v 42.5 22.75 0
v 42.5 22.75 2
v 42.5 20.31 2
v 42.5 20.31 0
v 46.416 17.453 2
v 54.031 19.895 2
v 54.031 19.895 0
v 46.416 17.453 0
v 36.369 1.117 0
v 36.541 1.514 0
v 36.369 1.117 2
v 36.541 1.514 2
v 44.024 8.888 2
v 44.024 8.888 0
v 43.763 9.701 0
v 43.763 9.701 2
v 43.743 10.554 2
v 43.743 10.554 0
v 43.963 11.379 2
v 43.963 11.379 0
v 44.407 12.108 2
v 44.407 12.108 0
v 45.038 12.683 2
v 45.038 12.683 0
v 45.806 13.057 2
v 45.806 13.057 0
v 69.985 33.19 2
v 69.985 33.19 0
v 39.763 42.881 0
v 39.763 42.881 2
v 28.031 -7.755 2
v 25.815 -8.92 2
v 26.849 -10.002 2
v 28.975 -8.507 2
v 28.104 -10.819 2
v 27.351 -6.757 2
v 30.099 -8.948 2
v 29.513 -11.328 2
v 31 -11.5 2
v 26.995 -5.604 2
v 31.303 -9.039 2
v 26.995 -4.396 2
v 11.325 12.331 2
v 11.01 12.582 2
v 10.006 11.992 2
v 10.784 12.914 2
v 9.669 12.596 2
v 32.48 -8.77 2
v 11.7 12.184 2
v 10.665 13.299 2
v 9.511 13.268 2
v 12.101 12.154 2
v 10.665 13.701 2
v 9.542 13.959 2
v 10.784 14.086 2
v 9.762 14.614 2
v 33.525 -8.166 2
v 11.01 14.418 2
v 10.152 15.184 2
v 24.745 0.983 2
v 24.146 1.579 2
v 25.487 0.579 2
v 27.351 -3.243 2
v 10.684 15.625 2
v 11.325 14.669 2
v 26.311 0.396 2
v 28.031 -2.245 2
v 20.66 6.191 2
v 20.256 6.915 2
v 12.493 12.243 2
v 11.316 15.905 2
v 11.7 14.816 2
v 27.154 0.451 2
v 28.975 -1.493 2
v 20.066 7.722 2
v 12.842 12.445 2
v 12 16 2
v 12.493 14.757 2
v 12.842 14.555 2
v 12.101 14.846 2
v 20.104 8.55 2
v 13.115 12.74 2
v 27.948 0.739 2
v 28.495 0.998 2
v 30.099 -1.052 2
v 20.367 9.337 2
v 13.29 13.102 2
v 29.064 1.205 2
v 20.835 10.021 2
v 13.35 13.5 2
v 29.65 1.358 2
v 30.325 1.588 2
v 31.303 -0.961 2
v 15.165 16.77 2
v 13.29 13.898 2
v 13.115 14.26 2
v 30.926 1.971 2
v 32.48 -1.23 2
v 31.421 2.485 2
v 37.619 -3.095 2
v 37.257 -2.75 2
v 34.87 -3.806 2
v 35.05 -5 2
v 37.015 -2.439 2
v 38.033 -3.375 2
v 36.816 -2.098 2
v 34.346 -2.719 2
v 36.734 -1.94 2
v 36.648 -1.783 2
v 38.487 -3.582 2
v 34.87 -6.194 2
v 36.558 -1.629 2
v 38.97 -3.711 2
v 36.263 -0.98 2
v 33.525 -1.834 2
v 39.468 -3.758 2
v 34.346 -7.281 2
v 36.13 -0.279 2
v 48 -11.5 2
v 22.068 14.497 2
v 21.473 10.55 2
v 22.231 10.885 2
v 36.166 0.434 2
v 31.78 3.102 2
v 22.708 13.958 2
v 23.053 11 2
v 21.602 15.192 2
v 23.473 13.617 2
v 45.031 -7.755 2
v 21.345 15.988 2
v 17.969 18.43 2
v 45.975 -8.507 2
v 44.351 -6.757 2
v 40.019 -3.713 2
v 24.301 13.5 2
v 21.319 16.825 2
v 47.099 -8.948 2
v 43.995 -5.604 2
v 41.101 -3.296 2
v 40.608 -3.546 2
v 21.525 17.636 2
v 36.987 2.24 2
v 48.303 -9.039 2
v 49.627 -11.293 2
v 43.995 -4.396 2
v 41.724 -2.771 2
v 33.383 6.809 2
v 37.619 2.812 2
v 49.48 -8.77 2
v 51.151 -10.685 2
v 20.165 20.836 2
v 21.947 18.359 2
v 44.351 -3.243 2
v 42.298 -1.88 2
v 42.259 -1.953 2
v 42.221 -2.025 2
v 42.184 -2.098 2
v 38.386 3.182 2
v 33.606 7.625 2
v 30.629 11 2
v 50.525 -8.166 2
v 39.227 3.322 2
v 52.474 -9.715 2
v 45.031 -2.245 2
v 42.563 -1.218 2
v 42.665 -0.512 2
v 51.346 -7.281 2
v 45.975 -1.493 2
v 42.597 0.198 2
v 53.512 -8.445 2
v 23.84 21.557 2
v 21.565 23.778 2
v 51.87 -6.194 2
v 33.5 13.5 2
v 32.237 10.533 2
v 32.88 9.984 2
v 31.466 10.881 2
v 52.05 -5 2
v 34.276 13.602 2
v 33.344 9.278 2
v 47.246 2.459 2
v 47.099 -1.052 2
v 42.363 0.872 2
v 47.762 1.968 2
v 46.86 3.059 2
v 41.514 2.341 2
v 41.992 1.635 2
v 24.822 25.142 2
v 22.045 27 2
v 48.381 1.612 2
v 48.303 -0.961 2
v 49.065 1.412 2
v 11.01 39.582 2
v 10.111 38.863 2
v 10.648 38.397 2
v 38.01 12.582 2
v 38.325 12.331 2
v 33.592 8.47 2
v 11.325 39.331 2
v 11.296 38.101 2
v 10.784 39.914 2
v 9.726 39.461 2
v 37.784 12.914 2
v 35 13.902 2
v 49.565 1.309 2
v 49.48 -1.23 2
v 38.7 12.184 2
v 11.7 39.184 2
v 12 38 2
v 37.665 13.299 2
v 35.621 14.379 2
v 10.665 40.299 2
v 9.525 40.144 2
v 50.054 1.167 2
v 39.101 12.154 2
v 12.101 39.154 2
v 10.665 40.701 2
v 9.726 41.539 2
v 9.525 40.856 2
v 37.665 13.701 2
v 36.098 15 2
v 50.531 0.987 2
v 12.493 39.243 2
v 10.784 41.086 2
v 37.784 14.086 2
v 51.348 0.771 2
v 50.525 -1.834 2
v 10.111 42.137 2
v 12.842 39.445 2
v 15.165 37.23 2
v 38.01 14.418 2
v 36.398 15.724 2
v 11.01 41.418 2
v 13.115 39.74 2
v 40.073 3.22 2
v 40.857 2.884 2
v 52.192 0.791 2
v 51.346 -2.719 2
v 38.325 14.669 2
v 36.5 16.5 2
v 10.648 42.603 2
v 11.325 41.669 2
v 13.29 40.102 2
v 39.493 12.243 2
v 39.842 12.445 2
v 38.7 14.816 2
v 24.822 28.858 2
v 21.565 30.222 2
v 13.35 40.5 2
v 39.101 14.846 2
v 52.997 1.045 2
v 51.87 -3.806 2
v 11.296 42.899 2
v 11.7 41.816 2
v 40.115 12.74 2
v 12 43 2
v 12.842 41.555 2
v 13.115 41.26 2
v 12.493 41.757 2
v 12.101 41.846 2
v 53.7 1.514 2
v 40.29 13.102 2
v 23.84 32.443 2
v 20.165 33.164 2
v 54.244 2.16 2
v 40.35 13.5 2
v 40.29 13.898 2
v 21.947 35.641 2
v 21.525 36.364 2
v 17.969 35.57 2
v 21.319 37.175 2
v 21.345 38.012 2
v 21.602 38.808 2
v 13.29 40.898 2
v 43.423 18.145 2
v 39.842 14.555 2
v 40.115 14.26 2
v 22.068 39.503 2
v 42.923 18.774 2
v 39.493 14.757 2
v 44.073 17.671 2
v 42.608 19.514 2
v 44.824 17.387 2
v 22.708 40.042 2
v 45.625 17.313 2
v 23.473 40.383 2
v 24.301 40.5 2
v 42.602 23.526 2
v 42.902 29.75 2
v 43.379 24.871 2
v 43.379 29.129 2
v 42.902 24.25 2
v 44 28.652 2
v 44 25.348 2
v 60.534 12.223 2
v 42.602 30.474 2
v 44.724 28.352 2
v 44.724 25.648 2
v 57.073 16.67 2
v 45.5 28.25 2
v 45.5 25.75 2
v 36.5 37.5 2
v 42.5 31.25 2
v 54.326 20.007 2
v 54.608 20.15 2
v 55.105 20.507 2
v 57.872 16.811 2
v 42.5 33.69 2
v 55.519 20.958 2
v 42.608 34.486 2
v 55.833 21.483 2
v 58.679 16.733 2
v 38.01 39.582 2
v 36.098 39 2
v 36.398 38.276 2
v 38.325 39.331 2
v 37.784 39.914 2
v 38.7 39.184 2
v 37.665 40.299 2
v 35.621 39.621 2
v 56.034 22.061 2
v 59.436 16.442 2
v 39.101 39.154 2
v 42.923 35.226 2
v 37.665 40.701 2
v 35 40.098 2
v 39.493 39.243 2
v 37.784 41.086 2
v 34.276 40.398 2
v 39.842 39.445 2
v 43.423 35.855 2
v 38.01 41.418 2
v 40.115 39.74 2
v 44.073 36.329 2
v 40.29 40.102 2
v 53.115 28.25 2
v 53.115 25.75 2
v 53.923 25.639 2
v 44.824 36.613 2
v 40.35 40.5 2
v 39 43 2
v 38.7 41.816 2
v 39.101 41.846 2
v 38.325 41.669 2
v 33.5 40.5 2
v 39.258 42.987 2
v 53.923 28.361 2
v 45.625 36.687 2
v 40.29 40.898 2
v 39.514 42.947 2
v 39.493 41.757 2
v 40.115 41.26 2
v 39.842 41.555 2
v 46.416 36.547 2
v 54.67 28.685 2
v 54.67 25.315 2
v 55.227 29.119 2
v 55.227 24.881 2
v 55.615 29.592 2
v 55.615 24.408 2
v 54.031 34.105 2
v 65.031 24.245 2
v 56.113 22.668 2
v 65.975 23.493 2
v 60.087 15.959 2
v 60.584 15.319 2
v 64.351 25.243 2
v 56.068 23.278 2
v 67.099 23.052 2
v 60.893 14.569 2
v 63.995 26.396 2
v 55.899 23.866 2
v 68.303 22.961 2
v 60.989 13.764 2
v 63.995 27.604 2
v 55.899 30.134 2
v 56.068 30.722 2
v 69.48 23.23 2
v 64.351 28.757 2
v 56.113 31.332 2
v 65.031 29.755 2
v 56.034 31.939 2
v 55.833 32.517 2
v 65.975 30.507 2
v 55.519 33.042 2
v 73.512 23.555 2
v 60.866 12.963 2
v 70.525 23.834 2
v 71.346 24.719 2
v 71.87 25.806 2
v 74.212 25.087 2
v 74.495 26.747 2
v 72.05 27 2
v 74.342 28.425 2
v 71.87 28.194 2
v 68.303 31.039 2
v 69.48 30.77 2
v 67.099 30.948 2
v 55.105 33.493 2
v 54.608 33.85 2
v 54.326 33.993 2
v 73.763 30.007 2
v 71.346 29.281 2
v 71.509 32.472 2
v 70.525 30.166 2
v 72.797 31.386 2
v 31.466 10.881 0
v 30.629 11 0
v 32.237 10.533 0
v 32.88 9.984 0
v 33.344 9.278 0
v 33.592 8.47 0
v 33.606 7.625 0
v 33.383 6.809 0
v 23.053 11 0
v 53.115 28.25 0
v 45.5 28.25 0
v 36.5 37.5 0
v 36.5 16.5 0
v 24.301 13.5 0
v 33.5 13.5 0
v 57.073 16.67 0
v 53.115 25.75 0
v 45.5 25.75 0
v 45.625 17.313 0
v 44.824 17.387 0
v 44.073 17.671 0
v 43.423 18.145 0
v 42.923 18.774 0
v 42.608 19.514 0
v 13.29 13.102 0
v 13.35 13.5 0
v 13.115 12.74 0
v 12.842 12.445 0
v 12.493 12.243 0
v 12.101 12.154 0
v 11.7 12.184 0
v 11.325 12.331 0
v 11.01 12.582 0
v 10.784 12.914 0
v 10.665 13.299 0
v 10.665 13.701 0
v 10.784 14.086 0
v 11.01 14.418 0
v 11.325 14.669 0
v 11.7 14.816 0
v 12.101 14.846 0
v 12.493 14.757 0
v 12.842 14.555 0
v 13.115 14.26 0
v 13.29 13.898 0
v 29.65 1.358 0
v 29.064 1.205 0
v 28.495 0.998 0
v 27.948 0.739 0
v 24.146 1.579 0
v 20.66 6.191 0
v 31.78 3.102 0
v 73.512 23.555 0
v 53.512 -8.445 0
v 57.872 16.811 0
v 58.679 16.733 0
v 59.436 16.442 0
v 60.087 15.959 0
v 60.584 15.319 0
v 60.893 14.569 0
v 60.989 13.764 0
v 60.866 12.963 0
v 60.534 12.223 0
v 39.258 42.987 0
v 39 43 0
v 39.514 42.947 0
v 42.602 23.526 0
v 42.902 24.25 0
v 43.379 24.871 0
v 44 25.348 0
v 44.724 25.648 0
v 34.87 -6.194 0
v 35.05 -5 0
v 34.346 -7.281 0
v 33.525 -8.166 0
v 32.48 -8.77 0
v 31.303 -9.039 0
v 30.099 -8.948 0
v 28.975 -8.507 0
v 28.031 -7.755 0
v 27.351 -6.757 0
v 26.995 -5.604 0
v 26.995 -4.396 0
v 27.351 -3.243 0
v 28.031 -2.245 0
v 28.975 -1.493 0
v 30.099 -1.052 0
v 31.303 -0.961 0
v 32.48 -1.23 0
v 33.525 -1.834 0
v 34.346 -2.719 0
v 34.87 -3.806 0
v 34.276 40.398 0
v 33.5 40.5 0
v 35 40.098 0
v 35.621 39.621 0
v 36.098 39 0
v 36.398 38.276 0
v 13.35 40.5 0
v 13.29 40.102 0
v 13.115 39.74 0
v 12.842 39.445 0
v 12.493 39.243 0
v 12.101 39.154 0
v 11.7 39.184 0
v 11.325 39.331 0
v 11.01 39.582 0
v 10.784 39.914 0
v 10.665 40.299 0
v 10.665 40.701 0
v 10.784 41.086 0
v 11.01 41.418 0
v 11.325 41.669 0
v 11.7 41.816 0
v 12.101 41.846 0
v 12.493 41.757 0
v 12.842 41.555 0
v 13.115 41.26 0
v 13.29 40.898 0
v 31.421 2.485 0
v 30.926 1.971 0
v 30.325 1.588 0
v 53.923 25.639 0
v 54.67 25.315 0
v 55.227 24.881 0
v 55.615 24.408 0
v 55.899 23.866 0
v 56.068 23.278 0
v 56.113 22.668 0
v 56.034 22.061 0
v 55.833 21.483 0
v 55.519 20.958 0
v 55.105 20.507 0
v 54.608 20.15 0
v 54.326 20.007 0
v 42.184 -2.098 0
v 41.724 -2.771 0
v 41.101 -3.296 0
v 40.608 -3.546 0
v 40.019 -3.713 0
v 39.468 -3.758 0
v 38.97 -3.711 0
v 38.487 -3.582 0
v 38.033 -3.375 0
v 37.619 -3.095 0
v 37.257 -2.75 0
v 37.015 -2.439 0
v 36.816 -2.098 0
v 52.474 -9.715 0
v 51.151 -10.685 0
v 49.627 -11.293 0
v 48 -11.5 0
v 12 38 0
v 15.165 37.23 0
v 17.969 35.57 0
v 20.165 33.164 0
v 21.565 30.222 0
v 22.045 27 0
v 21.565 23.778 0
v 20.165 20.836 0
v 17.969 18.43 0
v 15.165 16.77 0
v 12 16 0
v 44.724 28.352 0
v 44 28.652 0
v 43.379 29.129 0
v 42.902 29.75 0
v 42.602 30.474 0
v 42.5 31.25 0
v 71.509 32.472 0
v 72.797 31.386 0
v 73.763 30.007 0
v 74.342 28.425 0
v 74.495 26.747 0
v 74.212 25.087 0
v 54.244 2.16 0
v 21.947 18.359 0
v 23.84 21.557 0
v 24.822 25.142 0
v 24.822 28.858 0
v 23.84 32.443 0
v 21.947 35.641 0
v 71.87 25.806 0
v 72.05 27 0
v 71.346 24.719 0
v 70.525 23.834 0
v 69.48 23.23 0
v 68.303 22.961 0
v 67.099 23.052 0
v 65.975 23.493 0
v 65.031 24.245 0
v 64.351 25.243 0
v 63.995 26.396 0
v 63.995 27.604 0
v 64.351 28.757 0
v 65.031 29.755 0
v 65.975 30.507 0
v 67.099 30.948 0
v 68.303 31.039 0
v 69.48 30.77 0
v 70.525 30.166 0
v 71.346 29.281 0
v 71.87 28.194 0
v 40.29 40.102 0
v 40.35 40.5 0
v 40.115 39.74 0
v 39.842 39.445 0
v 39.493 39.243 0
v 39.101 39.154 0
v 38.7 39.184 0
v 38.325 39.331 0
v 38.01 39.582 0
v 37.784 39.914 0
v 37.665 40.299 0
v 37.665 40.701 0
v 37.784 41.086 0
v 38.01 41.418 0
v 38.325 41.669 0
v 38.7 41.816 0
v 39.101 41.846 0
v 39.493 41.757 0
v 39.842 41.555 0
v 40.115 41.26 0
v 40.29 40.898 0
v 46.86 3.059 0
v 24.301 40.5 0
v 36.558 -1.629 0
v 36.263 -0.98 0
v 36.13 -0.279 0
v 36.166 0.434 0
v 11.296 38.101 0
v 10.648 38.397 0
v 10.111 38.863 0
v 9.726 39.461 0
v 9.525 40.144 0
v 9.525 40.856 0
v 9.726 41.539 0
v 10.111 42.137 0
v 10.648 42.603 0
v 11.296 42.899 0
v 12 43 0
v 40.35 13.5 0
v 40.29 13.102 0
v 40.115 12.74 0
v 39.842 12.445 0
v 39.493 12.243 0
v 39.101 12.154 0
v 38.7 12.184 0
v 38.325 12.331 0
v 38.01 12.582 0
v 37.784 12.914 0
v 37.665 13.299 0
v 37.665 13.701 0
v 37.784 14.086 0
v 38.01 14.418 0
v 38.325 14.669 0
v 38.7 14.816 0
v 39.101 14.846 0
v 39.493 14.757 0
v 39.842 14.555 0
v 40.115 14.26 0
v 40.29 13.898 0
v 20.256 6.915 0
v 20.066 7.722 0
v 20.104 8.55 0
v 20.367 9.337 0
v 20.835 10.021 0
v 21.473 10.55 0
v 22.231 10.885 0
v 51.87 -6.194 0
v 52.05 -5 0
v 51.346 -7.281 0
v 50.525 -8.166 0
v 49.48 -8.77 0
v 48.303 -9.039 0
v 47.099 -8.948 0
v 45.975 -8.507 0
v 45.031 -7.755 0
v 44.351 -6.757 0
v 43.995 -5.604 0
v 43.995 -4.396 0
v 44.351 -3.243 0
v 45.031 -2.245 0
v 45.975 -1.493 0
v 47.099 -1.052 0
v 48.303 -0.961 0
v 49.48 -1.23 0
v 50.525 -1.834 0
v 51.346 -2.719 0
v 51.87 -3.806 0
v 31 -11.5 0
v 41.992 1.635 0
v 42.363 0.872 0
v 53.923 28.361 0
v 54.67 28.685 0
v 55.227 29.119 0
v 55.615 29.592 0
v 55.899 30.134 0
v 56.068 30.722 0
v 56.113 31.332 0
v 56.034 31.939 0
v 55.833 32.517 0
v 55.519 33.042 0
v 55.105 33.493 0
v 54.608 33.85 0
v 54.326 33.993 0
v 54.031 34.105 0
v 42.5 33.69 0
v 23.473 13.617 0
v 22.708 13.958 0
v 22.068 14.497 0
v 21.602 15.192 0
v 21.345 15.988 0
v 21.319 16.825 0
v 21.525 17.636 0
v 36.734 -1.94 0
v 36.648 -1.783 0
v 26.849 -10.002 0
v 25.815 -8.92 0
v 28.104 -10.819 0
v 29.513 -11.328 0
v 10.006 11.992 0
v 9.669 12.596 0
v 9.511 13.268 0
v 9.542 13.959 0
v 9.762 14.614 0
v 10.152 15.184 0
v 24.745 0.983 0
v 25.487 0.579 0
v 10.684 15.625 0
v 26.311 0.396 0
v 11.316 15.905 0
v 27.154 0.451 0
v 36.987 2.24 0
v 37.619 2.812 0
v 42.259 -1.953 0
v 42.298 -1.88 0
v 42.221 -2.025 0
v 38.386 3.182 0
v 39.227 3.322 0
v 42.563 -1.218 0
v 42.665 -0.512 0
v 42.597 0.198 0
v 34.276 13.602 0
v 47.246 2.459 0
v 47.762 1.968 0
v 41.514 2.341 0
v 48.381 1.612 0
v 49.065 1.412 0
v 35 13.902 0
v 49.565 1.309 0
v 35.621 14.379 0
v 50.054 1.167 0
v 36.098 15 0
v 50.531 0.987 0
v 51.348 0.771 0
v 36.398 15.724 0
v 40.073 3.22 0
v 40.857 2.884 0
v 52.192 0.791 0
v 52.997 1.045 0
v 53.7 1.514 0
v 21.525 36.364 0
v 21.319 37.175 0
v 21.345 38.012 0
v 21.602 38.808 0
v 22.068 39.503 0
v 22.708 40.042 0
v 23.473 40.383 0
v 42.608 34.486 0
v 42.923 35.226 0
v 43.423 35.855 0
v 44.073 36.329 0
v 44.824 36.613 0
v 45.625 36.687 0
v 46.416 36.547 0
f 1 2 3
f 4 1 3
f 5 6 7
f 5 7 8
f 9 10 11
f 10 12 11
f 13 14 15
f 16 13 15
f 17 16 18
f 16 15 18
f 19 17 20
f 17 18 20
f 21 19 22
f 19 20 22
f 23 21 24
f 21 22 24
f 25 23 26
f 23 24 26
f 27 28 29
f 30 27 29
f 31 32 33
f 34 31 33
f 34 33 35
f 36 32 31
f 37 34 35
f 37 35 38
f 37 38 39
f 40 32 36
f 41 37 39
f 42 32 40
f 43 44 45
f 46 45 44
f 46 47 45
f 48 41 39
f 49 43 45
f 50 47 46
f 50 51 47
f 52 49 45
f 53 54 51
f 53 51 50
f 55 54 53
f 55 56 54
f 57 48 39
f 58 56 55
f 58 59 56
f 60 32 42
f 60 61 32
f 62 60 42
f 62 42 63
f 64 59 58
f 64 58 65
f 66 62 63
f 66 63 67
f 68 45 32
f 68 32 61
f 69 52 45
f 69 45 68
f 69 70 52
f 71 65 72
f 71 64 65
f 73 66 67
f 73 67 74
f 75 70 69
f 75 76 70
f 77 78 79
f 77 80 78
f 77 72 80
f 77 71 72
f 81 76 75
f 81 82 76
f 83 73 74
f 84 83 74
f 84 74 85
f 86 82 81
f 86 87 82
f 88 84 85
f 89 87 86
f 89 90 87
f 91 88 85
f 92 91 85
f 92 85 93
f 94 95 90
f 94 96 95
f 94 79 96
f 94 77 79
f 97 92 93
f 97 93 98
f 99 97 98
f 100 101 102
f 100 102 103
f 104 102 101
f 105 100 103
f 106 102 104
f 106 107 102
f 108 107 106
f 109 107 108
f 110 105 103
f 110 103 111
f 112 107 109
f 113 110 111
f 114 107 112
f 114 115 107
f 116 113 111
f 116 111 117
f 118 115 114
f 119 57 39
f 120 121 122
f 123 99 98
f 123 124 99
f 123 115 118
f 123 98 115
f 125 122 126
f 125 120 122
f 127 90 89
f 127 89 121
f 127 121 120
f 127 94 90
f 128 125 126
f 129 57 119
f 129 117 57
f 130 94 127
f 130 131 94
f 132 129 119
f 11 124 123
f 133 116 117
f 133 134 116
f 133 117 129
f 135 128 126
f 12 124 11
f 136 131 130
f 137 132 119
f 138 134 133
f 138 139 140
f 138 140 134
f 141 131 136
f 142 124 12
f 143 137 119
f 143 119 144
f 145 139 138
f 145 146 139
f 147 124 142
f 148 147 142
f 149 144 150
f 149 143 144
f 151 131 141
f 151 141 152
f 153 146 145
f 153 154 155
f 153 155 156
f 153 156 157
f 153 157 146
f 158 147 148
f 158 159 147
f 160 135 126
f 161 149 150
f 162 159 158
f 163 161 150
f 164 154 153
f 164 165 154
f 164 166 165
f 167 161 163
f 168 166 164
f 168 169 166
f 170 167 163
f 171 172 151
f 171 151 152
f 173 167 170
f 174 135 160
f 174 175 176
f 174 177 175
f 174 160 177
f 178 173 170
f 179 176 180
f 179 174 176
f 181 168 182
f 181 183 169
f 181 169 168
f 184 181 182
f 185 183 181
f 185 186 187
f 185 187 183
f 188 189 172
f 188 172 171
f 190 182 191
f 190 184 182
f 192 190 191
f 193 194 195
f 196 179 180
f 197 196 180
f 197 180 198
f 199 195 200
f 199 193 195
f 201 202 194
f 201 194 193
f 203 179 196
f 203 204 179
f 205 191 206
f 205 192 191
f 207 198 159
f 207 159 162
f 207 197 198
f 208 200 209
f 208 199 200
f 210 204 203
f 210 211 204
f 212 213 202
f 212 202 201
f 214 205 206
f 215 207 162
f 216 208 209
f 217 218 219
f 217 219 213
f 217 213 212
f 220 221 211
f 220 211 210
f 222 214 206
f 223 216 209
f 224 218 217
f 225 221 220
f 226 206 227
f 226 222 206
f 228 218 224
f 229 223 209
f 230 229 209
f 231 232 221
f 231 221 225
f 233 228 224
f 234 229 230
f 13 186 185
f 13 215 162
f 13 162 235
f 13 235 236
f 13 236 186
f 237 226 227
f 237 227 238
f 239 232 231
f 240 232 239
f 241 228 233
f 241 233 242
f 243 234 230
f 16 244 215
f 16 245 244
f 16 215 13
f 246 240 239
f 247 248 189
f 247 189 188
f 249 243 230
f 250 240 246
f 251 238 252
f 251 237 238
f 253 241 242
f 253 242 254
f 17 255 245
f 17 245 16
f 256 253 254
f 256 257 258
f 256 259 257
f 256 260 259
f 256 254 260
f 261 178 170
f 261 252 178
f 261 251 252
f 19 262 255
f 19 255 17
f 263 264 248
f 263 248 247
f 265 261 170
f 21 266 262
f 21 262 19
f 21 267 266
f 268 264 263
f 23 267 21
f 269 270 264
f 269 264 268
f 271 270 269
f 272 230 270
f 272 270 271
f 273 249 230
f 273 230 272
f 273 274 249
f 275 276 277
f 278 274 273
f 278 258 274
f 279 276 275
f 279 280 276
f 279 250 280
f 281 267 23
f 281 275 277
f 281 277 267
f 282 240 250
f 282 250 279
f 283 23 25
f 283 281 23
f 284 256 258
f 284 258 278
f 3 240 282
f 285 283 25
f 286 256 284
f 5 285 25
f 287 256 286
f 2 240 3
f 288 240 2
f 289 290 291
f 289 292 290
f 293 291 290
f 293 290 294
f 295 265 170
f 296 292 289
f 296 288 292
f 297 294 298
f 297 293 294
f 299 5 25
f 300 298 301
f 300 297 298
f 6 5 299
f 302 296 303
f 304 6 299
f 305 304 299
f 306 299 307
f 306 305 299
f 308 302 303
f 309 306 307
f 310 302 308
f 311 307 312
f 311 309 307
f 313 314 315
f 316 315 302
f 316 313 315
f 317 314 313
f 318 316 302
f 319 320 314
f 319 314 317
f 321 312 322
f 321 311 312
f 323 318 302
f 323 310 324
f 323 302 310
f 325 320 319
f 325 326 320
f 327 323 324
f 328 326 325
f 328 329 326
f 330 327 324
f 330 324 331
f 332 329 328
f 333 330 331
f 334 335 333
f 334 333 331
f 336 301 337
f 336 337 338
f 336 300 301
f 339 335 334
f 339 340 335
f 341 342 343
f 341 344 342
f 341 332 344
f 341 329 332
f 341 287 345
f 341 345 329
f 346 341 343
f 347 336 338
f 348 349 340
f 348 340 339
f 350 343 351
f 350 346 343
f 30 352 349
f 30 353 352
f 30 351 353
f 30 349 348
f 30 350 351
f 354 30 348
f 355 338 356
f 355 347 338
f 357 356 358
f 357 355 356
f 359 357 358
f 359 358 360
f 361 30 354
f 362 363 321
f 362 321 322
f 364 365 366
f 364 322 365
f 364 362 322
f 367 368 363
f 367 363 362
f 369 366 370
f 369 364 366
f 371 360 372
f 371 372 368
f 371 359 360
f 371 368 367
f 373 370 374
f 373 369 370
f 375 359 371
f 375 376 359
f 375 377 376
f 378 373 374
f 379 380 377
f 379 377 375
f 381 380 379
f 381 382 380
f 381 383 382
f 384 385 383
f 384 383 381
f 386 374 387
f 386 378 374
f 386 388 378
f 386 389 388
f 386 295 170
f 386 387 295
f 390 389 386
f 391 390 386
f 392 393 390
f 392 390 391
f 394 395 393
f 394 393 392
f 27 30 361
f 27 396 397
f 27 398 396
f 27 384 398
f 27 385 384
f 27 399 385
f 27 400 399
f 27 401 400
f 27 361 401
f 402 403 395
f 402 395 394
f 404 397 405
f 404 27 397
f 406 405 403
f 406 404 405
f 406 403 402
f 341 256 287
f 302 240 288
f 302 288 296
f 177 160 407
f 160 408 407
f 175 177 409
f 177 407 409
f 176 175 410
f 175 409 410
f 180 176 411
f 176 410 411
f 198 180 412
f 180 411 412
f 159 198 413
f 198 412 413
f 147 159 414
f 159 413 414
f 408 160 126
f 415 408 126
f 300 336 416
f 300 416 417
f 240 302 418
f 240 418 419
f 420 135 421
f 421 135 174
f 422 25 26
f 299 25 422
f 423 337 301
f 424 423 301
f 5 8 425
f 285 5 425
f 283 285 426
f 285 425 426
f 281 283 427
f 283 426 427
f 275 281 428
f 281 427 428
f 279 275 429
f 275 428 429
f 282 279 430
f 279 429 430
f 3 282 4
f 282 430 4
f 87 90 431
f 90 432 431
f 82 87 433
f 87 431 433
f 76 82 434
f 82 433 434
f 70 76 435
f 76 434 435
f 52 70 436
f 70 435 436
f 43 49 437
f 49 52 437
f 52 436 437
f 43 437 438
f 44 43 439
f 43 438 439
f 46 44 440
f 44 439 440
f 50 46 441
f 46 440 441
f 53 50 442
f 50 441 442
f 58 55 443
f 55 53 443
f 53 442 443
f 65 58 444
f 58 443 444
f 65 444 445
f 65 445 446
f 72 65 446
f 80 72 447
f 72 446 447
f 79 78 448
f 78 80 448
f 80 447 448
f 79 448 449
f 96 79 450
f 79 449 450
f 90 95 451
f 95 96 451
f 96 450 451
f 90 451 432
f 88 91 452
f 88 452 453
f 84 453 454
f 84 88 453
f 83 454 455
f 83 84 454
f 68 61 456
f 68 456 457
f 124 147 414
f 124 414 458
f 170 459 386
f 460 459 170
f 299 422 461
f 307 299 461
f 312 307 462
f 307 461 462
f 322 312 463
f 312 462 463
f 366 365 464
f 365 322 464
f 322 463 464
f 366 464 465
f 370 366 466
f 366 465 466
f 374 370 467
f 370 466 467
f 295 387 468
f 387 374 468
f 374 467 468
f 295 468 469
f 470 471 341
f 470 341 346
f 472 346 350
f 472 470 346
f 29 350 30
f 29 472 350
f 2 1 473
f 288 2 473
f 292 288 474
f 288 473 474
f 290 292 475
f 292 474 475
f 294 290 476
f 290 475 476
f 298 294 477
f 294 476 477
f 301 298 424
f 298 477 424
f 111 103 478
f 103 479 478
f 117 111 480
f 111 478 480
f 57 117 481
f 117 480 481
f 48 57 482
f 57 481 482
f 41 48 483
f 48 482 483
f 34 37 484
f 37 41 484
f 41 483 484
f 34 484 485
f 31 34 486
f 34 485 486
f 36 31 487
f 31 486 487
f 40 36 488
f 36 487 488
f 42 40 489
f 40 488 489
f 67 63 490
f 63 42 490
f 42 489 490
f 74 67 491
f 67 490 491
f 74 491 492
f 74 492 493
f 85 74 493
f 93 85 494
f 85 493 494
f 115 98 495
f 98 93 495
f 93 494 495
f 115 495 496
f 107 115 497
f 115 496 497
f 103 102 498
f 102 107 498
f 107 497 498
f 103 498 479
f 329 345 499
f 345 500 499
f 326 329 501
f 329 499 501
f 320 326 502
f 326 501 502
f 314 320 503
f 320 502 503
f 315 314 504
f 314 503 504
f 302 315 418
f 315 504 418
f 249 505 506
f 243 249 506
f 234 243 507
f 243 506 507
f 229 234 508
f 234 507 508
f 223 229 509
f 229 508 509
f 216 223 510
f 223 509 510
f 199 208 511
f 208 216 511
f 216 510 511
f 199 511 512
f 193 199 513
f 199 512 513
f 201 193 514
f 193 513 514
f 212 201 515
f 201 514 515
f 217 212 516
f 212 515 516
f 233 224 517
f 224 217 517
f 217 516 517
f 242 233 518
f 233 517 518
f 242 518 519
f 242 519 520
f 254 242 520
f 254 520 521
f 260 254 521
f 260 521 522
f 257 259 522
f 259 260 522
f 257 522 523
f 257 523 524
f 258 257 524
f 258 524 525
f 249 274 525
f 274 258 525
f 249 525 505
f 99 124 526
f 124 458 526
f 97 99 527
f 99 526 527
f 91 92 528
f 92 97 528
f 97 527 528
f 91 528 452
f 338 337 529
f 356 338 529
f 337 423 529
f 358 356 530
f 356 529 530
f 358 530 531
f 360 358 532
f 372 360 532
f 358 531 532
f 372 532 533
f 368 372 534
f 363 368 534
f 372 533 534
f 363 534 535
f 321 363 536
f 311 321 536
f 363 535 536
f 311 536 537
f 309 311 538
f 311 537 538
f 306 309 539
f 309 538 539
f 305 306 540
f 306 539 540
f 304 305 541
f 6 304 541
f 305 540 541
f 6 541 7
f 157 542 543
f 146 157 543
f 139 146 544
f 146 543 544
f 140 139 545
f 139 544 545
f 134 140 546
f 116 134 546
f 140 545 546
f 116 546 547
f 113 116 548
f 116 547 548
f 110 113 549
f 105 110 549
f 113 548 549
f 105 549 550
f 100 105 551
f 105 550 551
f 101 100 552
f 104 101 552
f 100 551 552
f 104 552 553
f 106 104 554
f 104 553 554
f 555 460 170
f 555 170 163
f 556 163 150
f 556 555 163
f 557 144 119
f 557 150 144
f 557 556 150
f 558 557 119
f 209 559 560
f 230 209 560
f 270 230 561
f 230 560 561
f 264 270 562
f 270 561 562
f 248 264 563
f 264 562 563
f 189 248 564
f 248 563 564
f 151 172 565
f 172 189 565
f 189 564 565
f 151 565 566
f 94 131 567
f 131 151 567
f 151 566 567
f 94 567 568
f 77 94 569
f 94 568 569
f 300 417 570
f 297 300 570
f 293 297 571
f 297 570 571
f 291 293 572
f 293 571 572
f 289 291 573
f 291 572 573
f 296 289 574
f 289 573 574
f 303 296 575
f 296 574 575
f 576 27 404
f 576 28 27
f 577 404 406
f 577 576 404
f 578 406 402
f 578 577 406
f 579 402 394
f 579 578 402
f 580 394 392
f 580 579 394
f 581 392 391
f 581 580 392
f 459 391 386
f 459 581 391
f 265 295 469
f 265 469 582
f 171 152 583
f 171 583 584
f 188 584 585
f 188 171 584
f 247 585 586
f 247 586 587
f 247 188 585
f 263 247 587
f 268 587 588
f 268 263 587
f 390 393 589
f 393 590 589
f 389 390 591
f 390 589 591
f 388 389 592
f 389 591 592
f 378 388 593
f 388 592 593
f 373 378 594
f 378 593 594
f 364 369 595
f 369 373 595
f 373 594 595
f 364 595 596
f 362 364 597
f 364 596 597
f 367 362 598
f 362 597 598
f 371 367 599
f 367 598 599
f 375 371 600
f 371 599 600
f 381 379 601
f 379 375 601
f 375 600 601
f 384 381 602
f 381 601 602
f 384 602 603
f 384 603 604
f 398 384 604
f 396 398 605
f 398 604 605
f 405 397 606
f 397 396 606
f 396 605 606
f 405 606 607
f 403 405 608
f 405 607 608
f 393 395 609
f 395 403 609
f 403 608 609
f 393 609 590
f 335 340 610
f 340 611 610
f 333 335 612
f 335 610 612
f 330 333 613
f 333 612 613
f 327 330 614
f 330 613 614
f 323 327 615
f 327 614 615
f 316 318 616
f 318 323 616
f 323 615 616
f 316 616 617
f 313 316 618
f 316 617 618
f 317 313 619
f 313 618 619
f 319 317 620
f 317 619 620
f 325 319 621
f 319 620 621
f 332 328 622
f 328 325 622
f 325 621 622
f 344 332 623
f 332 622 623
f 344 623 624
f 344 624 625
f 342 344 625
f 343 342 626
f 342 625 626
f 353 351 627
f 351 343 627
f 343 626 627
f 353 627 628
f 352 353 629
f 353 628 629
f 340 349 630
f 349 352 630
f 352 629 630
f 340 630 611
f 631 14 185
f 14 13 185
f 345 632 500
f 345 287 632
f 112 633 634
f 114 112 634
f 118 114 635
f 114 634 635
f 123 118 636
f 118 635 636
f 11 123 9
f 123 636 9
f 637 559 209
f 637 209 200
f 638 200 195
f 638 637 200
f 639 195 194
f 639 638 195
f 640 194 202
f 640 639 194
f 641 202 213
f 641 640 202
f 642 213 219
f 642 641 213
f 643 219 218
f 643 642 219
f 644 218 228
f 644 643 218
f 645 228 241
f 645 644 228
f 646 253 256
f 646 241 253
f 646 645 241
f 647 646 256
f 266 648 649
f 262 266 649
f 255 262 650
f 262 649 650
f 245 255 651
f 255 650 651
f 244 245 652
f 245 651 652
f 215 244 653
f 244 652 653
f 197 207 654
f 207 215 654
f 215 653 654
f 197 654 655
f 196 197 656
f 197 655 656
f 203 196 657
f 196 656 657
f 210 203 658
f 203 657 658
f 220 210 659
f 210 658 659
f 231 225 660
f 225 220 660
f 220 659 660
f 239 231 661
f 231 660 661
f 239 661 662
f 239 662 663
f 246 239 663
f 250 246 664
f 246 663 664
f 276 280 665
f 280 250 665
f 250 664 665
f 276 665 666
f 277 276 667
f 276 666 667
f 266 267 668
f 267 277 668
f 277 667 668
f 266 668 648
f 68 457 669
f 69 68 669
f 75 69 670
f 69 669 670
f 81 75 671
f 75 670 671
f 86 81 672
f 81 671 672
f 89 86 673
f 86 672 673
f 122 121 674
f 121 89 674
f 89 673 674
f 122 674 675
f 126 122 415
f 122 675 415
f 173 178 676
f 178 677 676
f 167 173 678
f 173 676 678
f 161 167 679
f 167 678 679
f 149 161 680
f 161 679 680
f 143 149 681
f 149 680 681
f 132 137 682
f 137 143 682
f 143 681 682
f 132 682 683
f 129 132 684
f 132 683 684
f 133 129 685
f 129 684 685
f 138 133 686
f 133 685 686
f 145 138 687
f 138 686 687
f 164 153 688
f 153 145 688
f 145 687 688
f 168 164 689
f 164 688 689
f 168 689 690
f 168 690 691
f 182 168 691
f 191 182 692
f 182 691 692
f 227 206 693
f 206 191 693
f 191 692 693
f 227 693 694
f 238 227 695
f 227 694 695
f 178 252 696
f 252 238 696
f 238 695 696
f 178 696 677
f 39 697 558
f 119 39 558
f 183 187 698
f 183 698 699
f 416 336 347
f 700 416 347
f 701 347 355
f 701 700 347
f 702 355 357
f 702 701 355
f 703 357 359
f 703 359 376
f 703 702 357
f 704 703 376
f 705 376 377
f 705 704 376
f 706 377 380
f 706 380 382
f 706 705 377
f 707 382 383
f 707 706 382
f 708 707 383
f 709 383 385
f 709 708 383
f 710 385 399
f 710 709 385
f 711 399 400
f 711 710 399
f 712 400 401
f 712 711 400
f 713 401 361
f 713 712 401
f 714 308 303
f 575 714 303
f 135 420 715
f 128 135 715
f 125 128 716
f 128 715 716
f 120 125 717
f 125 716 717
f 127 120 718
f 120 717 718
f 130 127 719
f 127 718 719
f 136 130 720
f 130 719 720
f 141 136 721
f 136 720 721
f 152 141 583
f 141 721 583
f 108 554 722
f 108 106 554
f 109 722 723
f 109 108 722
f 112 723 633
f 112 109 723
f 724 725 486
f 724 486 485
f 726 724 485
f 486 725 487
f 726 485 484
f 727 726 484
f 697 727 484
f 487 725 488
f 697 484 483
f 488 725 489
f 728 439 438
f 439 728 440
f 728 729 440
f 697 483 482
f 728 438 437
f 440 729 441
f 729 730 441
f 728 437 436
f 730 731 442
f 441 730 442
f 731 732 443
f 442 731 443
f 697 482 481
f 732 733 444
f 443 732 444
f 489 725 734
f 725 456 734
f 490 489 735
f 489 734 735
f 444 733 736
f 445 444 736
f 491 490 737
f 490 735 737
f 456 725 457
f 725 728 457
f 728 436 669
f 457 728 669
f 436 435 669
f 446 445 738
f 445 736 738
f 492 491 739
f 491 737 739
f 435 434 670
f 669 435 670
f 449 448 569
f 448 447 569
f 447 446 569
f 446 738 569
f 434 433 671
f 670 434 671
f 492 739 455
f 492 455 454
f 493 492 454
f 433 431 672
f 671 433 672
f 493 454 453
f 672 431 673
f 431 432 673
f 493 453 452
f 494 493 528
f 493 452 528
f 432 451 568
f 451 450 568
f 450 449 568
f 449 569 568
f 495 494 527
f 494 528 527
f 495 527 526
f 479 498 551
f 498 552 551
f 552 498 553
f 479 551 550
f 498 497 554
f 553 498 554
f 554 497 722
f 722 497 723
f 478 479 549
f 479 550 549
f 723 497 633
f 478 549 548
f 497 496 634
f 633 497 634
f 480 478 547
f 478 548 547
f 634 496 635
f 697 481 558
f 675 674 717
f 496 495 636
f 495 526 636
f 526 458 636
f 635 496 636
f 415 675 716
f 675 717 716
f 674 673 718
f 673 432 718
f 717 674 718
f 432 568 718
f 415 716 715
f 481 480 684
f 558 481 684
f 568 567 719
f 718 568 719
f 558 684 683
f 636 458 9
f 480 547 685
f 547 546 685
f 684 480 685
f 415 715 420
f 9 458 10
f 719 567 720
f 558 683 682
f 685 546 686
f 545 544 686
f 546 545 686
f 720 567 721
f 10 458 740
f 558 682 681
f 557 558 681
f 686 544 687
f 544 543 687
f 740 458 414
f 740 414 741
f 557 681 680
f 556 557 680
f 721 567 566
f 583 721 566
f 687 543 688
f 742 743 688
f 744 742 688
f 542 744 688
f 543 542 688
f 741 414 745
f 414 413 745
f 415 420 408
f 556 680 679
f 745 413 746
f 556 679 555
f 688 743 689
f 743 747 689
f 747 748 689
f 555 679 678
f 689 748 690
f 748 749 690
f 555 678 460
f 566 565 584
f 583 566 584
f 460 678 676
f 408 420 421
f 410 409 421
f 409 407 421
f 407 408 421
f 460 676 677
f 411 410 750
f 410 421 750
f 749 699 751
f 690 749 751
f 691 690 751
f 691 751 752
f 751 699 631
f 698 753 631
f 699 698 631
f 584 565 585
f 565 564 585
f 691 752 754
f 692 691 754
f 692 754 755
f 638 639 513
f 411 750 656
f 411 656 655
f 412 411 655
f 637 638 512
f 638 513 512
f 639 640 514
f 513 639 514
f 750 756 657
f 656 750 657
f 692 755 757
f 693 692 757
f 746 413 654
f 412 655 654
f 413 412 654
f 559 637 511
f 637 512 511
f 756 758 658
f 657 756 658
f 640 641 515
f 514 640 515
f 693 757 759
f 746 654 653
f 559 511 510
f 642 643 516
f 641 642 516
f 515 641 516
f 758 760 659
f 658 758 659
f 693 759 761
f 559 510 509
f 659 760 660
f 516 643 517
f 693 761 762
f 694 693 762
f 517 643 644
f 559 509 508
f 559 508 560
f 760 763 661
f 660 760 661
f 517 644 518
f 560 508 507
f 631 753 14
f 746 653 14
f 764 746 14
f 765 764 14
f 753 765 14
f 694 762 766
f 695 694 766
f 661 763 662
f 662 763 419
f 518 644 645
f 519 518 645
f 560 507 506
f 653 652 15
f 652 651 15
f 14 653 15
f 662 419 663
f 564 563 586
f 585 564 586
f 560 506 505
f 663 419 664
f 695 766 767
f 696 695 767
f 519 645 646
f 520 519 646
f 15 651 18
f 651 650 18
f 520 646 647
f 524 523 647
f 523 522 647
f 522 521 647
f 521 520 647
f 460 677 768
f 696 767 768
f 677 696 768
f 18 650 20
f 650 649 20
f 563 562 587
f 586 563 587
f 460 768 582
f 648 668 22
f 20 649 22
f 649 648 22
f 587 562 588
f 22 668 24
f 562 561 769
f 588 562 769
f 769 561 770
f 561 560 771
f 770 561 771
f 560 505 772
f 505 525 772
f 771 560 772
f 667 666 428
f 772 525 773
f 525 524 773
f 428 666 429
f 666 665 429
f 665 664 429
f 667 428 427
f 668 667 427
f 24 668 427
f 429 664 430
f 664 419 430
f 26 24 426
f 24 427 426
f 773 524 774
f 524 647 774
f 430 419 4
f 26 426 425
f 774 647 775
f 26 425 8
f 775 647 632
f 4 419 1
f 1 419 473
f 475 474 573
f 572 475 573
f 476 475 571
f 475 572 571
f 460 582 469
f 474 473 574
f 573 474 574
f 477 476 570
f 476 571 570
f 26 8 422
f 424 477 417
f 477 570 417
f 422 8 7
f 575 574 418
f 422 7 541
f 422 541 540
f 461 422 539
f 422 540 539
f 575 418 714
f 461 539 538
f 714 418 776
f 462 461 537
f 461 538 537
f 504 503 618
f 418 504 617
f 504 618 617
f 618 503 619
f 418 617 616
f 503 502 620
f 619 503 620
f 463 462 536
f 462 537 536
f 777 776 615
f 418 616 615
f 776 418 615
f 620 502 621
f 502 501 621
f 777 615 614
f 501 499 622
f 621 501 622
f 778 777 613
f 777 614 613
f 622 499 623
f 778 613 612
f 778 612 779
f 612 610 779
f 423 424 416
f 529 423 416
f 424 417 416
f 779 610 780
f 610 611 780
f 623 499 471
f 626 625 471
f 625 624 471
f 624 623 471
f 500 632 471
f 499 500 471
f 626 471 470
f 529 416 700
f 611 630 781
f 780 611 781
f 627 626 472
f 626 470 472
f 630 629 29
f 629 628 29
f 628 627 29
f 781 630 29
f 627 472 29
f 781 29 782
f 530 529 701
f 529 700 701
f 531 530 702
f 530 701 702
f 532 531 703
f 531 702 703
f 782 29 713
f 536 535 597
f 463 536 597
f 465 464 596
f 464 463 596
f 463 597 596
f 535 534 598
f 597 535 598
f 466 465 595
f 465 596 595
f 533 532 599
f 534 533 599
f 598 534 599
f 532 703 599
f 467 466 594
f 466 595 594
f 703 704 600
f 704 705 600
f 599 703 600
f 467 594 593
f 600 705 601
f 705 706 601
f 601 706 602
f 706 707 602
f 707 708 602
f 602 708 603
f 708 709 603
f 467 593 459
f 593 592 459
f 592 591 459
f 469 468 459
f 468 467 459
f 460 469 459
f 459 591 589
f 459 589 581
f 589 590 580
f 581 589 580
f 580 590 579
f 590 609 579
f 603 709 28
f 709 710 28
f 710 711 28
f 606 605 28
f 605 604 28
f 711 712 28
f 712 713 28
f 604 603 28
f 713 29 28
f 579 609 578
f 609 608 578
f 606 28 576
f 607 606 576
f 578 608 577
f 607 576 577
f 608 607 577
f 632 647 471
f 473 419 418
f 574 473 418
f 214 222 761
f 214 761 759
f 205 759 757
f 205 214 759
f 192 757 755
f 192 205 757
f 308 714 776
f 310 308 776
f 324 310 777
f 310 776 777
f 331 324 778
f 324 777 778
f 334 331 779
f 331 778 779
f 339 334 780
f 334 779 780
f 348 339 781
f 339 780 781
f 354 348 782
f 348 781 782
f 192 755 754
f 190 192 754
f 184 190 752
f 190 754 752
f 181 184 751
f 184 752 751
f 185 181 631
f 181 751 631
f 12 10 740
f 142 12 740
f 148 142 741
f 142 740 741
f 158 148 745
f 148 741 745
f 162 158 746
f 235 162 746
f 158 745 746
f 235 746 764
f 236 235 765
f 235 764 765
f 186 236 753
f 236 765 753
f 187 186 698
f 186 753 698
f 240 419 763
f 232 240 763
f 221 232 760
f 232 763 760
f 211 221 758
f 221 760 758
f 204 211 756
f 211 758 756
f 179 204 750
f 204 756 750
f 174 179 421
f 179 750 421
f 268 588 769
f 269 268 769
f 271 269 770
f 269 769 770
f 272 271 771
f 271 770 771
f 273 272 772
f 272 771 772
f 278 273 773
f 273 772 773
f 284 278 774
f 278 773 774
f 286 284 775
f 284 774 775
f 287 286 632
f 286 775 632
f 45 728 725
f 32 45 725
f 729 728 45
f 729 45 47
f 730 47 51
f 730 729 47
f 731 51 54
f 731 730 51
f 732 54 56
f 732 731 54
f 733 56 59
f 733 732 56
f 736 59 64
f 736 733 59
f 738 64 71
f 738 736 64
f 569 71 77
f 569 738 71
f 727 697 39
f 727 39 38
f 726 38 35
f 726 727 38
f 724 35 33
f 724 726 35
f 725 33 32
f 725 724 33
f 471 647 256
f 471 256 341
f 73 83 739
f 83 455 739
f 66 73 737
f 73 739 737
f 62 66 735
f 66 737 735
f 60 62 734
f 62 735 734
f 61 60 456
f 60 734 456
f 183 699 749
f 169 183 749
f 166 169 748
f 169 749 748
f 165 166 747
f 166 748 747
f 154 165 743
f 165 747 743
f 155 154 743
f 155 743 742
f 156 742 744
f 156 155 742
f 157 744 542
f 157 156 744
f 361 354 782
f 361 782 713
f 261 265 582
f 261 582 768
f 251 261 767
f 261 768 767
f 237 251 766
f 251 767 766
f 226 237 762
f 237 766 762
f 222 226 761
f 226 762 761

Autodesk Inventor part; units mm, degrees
ref_plane "YZ Plane" through (0, 0, 0) normal (1, 0, 0) x (0, 1, 0)
ref_plane "XZ Plane" through (0, 0, 0) normal (0, 1, 0) x (-1, 0, 0)
ref_plane "XY Plane" through (0, 0, 0) normal (0, 0, 1) x (1, 0, 0)
sketch "スケッチ1" plane through (0, 0, 0) normal (0, 0, 1) x (1, 0, 0)
  circle A0 centre (68, 27) radius 4.05
  circle A1 centre (31, -5) radius 4.05
  circle A2 centre (48, -5) radius 4.05
  circle A3 centre (68, 27) radius 6.5 construction
  circle A4 centre (31, -5) radius 6.5 construction
  circle A5 centre (48, -5) radius 6.5 construction
  line L0 (31, -11.5) -> (48, -11.5)
  line L1 (73.512, 23.555) -> (53.512, -8.445)
  arc A6 (48, -11.5) -> (53.512, -8.445) centre (48, -5) ccw
  circle A7 centre (39, 13.5) radius 1.35
  line L2 (39, 13.5) -> (39, 40.5) construction
  line L3 (39, 40.5) -> (12, 40.5) construction
  line L4 (12, 40.5) -> (12, 13.5) construction
  line L5 (12, 13.5) -> (39, 13.5) construction
  circle A8 centre (12, 13.5) radius 1.35
  circle A9 centre (12, 40.5) radius 1.35
  circle A10 centre (39, 40.5) radius 1.35
  circle A11 centre (11, 27) radius 8.5 construction
  circle A12 centre (11, 27) radius 10.5 construction
  arc A13 (0, 15.381) -> (0, 38.619) centre (11, 27) ccw construction
  line L6 (0, 15.381) -> (0, 38.619) construction
  line L7 (11, 11) -> (11, 43) construction
  line L8 (11, 43) -> (51.5, 43) construction
  line L9 (51.5, 43) -> (51.5, 11) construction
  line L10 (51.5, 11) -> (11, 11) construction
  circle A14 centre (39, 13.5) radius 2.5 construction
  circle A15 centre (39, 40.5) radius 2.5 construction
  circle A16 centre (12, 40.5) radius 2.5 construction
  circle A17 centre (12, 13.5) radius 2.5 construction
  line L11 (10.0057, 11.9924) -> (25.8149, -8.9198)
  line L12 (69.9848, 33.1896) -> (39.7634, 42.8806)
  arc A18 (25.8149, -8.9198) -> (31, -11.5) centre (31, -5) ccw
  arc A19 (12, 16) -> (10.0057, 11.9924) centre (12, 13.5) ccw
  arc A20 (12, 16) -> (12, 38) centre (11, 27) ccw
  line L13 (12, 43) -> (39, 43)
  arc A21 (39.7634, 42.8806) -> (39, 43) centre (39, 40.5) ccw
  arc A22 (73.512, 23.555) -> (69.9848, 33.1896) centre (68, 27) ccw
  arc A23 (12, 43) -> (12, 38) centre (12, 40.5) ccw
  point P0 (0, 0)
  point P1 (62.8293, 30.9388)
  point P2 (24.5, -5)
  point P3 (1.5716, 22.3787)
  point P4 (39, 11)
  dimension "d60" = 21
  dimension "d17" = 8.1
  dimension "d21" = 5
  dimension "d24" = 17
  dimension "d26" = 20
  dimension "d27" = 13
  dimension "d55" = 2.7
  dimension "d56" = 27
  dimension "d57" = 27
  dimension "d58" = 17
  dimension "d59" = 1
  dimension "d61" = 32
  dimension "d62" = 13.5
  dimension "d63" = 12
  dimension "d64" = 51.5
  dimension "d65" = 5
  dimension "d66" = 57
  dimension "d67" = 32
  dimension "d68" = 32
  dimension "d69" = 20
extrude "押し出し1" add sketch "スケッチ1" along normal blind 2
sketch "スケッチ5" plane through (0, 0, 2) normal (0, 0, 1) x (1, 0, 0)
  circle A0 centre (12, 40.5) radius 1.35 projected
  circle A1 centre (39, 40.5) radius 1.35 projected
  circle A2 centre (39, 13.5) radius 1.35 projected
  circle A3 centre (12, 13.5) radius 1.35 projected
  circle A4 centre (31, -5) radius 4.05 projected
  circle A5 centre (48, -5) radius 4.05 projected
  circle A6 centre (68, 27) radius 4.05 projected
  line L0 (39, 43) -> (12, 43) projected
  circle A7 centre (12, 40.5) radius 2.5 construction
  circle A8 centre (39, 40.5) radius 2.5 construction
  circle A9 centre (39, 13.5) radius 2.5 construction
  circle A10 centre (12, 13.5) radius 2.5 construction
  circle A11 centre (31, -5) radius 6.5 construction
  circle A12 centre (48, -5) radius 6.5 construction
  circle A13 centre (68, 27) radius 6.5 construction
  arc A14 (73.512, 23.555) -> (69.9848, 33.1896) centre (68, 27) ccw projected
  line L1 (14.5, 40.5) -> (36.5, 40.5)
  line L2 (36.5, 40.5) -> (36.5, 13.5)
  line L3 (14.5, 13.5) -> (36.5, 13.5)
  arc A15 (12, 16) -> (12, 38) centre (11, 27) ccw projected
  arc A16 (14.5, 13.5) -> (14.5, 40.5) centre (11, 27) ccw
  line L4 (40.4464, 38.4609) -> (42.5, 37.8024)
  line L5 (69.9848, 33.1896) -> (39.7634, 42.8806) projected
  line L6 (68, 27) -> (11, 27) construction
  line L7 (63.0499, 22.7873) -> (42.5, 16.1976)
  line L8 (42.5, 37.8024) -> (42.5, 28.25)
  line L9 (39.7634, 11.1194) -> (42.5098, 12.0001)
  arc A17 (63.0499, 31.2127) -> (61.6213, 28.25) centre (68, 27) ccw
  line L10 (39, 13.5) -> (48, -5) construction
  line L11 (39, 13.5) -> (31, -5) construction
  line L12 (41.2481, 14.5937) -> (42.5098, 12.0001)
  line L13 (36.7519, 12.4063) -> (39.1337, 7.5105)
  line L14 (41.2946, 12.5077) -> (39.1337, 7.5105)
  line L15 (65.92, 20.8418) -> (64.8766, 19.1724)
  line L16 (53.512, -8.445) -> (73.512, 23.555) projected
  arc A18 (52.624, -0.4318) -> (47.6233, 1.4891) centre (48, -5) ccw
  line L17 (10.0057, 11.9924) -> (25.8149, -8.9198) projected
  line L18 (37.5, -5) -> (41.5, -5)
  arc A19 (43.1271, -0.6983) -> (41.5, -5) centre (48, -5) ccw
  arc A20 (37.5, -5) -> (35.6761, -0.4851) centre (31, -5) ccw
  arc A21 (31.0868, 1.4994) -> (25.9894, -0.8594) centre (31, -5) ccw
  line L19 (31, -5) -> (48, -5) construction
  line L20 (39.1337, 7.5105) -> (43.1271, -0.6983)
  line L21 (39.1337, 7.5105) -> (35.6761, -0.4851)
  line L22 (42.5098, 12.0001) -> (64.8766, 19.1724)
  line L23 (42.5098, 12.0001) -> (47.6233, 1.4891)
  line L24 (42.5, 16.1976) -> (40.4464, 15.5391)
  line L25 (42.5, 37.8024) -> (63.0499, 31.2127)
  line L26 (64.8766, 19.1724) -> (69.9848, 20.8104)
  line L27 (64.8766, 19.1724) -> (52.624, -0.4318)
  line L28 (36.0599, 11) -> (35.1952, 11)
  line L29 (36.7054, 14.4923) -> (35.1952, 11)
  line L30 (25.9894, -0.8594) -> (17.0239, 11)
  line L31 (17.0239, 11) -> (13.9943, 15.0076)
  line L32 (17.0239, 11) -> (14.4985, 11)
  line L33 (35.1952, 11) -> (17.0239, 11)
  line L34 (35.1952, 11) -> (31.0868, 1.4994)
  line L35 (61.6213, 28.25) -> (42.5, 28.25)
  line L36 (61.6213, 25.75) -> (42.5, 25.75)
  arc A22 (61.6213, 28.25) -> (61.6213, 25.75) centre (68, 27) ccw construction
  arc A23 (61.6213, 25.75) -> (63.0499, 22.7873) centre (68, 27) ccw
  line L37 (42.5, 28.25) -> (42.5, 25.75) construction
  line L38 (42.5, 25.75) -> (42.5, 16.1976)
  point P0 (0, 0)
  dimension "d71" = 4
  dimension "d73" = 5
  dimension "d75" = 5
  dimension "d81" = 6
  dimension "d82" = 2.5
  dimension "d83" = 5
  dimension "d84" = 5
  dimension "d85" = 2.5
extrude "押し出し3" cut sketch "スケッチ5" against normal through all contours L1 L2 L29 L3 L31 A16 | L31 L3 A16 | L2 L3 L29 | L33 L34 A21 L30 | L7 L38 L36 A23 | L25 A17 L35 L8 | L22 L27 A18 L23 | L20 A19 L18 A20 L21
fillet "フィレット2" radius 3 25 edges at (36.5, 13.5, 1) (39.1337, 7.5105, 1) (42.5098, 12.0001, 1) (35.6761, -0.4851, 1) (37.5, -5, 1) (43.1271, -0.6983, 1) (41.5, -5, 1) (47.6233, 1.4891, 1) (52.624, -0.4318, 1) (64.8766, 19.1724, 1) (63.0499, 22.7873, 1) (63.0499, 31.2127, 1) (42.5, 37.8024, 1) (36.5, 40.5, 1) (31.0868, 1.4994, 1) (25.9894, -0.8594, 1) (42.5, 16.1976, 1) (14.5, 13.5, 1) (14.5, 40.5, 1) (35.1952, 11, 1) (17.0239, 11, 1) (42.5, 25.75, 1) (42.5, 28.25, 1) (61.6213, 28.25, 1) (61.6213, 25.75, 1)
equation "\"d62\" = 0.5 * d56"
equation "\"d45\" = d44"
equation "\"d44\" = 6"
properties part number "膝_メインフレーム" material "アルミニウム 2014-T4"
